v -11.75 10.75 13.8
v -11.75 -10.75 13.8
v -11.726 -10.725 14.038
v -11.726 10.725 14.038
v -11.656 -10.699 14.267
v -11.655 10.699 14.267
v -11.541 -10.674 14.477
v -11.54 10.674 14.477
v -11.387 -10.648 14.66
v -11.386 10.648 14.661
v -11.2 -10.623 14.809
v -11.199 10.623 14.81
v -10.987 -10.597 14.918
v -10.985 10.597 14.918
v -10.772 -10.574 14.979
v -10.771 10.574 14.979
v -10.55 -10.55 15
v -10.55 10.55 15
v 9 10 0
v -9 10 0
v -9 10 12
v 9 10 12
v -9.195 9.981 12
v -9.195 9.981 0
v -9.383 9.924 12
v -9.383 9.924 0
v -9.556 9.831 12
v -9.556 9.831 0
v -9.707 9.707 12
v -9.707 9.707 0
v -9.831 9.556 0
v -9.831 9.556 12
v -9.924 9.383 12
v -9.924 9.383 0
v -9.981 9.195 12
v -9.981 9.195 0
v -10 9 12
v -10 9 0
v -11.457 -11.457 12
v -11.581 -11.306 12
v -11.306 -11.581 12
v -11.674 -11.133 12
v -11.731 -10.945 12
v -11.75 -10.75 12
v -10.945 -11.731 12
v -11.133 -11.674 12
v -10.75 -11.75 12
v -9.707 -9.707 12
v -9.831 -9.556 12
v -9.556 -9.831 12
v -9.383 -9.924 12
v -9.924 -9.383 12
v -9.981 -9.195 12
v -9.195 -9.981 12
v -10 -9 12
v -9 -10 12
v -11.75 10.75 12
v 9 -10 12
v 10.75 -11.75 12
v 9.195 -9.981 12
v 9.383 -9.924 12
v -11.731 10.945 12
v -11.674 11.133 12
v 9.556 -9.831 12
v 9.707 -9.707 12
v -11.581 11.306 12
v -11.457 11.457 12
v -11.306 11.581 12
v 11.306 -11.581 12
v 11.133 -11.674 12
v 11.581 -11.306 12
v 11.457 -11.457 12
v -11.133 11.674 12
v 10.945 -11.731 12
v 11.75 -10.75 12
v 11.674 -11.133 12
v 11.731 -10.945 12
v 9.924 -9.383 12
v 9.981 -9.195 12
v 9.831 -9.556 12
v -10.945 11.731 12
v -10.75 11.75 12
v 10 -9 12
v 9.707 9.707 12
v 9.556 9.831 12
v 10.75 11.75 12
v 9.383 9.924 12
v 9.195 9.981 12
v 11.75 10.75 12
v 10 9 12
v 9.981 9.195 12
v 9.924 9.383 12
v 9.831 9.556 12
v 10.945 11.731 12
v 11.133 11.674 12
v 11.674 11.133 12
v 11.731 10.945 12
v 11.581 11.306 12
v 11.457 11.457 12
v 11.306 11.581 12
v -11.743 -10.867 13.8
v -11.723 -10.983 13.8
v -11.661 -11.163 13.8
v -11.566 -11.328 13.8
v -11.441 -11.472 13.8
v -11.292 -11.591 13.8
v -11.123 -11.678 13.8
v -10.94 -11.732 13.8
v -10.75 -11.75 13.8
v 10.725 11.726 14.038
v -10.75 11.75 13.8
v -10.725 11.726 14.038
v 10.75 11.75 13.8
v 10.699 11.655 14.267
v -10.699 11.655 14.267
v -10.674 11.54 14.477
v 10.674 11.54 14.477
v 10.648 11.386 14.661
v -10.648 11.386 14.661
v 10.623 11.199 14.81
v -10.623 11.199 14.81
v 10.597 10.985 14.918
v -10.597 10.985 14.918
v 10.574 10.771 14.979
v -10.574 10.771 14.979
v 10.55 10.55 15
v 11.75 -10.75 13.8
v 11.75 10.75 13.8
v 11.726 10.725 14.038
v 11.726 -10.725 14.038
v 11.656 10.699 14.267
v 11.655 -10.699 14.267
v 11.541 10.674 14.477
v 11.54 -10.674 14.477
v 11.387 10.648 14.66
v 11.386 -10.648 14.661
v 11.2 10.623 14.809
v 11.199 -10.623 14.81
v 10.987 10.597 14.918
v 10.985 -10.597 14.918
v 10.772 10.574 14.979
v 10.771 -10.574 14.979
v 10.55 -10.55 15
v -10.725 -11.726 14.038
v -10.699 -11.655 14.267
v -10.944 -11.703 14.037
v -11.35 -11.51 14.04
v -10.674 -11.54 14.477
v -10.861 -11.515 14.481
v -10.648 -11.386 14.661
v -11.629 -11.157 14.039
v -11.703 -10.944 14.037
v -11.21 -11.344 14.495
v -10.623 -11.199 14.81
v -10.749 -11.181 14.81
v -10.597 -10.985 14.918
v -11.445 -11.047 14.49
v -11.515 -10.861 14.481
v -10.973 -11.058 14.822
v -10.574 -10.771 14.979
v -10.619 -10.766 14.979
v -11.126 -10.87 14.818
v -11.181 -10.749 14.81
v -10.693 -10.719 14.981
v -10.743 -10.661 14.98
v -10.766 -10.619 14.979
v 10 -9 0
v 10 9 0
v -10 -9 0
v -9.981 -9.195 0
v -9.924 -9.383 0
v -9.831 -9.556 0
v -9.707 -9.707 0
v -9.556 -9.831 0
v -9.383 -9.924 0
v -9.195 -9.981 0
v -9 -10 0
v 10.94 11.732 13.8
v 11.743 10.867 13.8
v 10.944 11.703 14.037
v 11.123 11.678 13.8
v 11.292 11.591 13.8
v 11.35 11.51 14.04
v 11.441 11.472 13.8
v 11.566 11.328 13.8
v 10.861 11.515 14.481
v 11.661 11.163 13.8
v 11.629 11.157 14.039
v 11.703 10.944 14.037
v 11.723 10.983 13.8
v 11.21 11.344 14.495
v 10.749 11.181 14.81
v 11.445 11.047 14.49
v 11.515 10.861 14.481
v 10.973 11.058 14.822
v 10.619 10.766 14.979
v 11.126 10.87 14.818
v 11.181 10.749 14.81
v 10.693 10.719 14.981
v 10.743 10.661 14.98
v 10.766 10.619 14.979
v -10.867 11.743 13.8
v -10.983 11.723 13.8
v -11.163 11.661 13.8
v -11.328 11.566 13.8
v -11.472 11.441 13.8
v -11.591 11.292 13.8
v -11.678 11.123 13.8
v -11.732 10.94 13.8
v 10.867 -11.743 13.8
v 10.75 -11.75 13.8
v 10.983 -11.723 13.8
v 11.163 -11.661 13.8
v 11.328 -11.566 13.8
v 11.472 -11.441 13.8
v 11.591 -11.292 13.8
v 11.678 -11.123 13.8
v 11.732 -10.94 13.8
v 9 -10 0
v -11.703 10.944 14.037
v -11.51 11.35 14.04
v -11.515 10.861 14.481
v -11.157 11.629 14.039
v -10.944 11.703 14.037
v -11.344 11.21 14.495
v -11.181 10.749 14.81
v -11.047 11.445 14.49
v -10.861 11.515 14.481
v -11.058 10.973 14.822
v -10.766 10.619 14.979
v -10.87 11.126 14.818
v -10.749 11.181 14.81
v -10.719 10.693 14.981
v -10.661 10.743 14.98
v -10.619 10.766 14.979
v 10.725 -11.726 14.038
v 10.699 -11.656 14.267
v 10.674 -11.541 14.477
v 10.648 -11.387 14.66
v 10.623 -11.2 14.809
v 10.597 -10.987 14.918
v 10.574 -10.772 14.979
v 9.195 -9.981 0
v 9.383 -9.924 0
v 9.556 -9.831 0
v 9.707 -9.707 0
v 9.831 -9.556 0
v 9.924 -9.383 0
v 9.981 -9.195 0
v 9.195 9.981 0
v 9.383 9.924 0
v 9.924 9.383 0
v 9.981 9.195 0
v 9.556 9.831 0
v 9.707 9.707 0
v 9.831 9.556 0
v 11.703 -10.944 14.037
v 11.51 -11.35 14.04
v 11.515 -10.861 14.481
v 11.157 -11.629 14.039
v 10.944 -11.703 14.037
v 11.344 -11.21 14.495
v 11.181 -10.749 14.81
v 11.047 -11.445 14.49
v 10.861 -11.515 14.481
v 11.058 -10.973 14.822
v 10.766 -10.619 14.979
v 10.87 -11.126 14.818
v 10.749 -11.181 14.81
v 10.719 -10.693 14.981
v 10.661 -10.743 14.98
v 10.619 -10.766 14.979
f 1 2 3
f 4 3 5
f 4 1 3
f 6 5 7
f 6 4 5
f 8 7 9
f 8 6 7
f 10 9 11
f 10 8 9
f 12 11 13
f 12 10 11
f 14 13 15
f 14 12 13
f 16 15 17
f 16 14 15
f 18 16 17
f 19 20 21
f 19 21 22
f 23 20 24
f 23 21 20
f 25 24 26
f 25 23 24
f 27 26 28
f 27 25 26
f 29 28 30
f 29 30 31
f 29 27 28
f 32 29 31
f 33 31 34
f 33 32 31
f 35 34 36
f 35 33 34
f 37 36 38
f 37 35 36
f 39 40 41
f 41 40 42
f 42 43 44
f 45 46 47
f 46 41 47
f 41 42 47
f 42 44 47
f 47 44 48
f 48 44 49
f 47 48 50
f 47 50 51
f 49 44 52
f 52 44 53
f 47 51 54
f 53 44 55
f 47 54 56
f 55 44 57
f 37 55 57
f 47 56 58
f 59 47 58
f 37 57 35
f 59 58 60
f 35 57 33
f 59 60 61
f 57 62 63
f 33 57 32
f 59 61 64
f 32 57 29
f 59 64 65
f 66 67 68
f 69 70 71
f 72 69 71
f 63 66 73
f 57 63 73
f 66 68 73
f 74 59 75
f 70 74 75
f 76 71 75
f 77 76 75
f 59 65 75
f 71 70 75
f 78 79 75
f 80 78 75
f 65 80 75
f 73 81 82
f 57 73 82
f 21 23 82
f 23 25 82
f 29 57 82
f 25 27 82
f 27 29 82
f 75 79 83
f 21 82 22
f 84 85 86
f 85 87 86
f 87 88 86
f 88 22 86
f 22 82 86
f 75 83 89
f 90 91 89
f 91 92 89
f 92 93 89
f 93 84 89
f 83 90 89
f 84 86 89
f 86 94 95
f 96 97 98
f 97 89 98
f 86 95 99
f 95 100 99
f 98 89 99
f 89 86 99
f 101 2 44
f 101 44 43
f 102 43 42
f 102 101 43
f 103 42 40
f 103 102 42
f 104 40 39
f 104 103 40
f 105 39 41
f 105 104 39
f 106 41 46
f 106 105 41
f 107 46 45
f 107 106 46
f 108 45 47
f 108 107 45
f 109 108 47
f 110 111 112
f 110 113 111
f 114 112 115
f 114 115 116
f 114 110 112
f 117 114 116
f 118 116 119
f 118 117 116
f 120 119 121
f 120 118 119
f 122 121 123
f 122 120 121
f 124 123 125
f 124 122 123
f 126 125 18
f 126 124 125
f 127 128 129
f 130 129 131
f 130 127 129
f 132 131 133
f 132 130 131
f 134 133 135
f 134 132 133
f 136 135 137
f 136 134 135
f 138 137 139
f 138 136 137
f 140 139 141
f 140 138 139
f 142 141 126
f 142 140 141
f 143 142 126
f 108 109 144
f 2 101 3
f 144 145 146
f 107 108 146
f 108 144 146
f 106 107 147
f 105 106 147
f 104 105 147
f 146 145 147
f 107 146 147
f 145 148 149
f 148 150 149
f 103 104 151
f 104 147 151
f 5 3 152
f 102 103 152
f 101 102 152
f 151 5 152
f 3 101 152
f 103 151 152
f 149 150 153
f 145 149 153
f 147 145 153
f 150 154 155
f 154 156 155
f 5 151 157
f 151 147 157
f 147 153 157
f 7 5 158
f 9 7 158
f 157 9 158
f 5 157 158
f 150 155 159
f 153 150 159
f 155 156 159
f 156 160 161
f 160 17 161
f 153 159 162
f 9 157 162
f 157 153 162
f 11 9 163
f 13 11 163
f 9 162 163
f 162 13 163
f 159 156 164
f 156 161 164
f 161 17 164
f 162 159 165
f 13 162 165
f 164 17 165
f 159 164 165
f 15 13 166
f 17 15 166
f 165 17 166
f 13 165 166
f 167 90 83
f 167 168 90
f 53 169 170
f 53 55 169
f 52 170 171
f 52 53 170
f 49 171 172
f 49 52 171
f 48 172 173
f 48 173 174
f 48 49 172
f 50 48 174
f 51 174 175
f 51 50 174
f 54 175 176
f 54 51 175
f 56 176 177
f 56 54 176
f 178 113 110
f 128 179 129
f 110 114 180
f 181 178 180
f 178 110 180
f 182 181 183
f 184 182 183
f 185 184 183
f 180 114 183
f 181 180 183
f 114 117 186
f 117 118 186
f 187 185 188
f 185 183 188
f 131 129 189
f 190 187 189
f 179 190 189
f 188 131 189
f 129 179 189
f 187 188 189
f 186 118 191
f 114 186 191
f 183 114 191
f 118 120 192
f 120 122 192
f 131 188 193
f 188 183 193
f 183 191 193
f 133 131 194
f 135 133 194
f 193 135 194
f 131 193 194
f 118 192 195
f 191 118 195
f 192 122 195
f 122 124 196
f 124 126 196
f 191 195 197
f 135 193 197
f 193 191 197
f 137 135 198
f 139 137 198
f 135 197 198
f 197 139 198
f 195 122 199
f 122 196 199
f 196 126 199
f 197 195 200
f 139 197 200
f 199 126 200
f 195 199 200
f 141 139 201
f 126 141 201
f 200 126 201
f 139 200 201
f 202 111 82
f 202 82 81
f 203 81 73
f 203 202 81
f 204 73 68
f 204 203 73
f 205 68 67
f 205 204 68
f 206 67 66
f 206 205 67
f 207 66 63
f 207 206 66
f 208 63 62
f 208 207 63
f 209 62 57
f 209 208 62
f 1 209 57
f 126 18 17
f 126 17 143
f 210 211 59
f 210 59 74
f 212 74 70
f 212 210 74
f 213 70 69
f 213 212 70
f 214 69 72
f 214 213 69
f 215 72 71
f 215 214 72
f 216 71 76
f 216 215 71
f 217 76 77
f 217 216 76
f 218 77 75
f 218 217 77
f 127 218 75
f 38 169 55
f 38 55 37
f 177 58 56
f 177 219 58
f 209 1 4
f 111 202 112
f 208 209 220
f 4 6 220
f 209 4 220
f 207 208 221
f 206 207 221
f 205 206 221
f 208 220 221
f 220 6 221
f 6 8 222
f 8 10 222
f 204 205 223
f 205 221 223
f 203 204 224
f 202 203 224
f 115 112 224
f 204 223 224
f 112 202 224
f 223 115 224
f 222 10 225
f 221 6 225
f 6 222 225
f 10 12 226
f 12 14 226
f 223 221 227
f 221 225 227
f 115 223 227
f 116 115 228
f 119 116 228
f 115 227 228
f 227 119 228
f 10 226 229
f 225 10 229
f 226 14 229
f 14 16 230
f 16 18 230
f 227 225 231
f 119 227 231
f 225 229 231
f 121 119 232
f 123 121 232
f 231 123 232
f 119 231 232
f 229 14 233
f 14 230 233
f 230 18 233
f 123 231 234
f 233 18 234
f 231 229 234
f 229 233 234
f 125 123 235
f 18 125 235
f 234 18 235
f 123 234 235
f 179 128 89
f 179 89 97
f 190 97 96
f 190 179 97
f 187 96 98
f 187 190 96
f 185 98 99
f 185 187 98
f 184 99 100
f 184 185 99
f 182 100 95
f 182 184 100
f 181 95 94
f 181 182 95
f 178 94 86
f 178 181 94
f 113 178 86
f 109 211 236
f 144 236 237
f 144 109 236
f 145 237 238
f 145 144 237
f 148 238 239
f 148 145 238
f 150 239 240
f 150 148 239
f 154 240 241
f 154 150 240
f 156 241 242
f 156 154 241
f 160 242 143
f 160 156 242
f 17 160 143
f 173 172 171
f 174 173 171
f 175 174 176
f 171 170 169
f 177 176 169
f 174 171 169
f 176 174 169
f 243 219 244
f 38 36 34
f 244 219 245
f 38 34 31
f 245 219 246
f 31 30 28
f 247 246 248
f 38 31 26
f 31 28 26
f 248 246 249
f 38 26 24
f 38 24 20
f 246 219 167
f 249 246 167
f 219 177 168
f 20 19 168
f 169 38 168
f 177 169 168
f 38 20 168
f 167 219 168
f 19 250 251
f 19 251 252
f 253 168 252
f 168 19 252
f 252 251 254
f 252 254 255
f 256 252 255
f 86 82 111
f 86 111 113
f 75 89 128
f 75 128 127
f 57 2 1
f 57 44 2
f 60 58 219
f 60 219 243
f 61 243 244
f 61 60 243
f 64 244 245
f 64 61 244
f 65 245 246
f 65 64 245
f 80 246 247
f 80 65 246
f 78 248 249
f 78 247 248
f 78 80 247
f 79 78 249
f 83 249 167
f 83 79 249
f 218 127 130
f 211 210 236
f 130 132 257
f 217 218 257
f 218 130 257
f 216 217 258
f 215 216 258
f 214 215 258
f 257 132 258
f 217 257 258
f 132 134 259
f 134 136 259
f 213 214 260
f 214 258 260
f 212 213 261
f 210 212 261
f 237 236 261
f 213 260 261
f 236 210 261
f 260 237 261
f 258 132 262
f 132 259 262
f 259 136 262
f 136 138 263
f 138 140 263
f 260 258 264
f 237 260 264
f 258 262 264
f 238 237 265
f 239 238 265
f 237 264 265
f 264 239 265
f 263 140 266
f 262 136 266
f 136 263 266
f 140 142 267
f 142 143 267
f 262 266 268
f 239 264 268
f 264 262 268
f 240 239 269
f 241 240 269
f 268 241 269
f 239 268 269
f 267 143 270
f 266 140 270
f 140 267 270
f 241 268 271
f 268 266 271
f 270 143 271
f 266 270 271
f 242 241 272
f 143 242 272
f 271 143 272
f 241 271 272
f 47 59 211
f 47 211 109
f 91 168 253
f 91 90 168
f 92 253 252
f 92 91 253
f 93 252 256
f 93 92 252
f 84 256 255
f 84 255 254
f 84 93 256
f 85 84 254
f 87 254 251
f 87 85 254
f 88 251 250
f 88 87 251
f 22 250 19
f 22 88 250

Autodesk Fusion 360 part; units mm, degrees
sketch "Sketch1" plane through (0, 0, 0) normal (0, 0, 1) x (1, 0, 0)
  line L0 (10, -10) -> (-10, -10)
  line L1 (-10, -10) -> (-10, 10)
  line L2 (-10, 10) -> (10, 10)
  line L3 (10, 10) -> (10, -10)
  line L4 (10, -10) -> (-10, 10) construction
  line L5 (-10, -10) -> (10, 10) construction
  line L6 (11.75, -11.75) -> (-11.75, -11.75)
  line L7 (-11.75, -11.75) -> (-11.75, 11.75)
  line L8 (-11.75, 11.75) -> (11.75, 11.75)
  line L9 (11.75, 11.75) -> (11.75, -11.75)
  line L10 (11.75, -11.75) -> (-11.75, 11.75) construction
  line L11 (-11.75, -11.75) -> (11.75, 11.75) construction
  dimension "d1" = 20
  dimension "d2" = 20
  dimension "d3" = 23.5
  dimension "d4" = 23.5
extrude "Extrude1" add sketch "Sketch1" along normal blind 15 contours L0 L1 L2 L3 | L6 L7 L8 L9
extrude "Extrude2" cut sketch "Sketch1" along normal blind 12
fillet "Fillet1" radius 1 4 edges at (11.75, 11.75, 13.5) (-11.75, 11.75, 13.5) (11.75, -11.75, 13.5) (-11.75, -11.75, 13.5)
fillet "Fillet2" radius 1 4 edges at (-10, 10, 6) (10, 10, 6) (10, -10, 6) (-10, -10, 6)
fillet "Fillet3" radius 1.2 8 edges at (-11.4571, 11.4571, 15) (-11.75, 0, 15) (-11.4571, -11.4571, 15) (0, -11.75, 15) (11.4571, -11.4571, 15) (11.75, 0, 15) (11.4571, 11.4571, 15) (0, 11.75, 15)
